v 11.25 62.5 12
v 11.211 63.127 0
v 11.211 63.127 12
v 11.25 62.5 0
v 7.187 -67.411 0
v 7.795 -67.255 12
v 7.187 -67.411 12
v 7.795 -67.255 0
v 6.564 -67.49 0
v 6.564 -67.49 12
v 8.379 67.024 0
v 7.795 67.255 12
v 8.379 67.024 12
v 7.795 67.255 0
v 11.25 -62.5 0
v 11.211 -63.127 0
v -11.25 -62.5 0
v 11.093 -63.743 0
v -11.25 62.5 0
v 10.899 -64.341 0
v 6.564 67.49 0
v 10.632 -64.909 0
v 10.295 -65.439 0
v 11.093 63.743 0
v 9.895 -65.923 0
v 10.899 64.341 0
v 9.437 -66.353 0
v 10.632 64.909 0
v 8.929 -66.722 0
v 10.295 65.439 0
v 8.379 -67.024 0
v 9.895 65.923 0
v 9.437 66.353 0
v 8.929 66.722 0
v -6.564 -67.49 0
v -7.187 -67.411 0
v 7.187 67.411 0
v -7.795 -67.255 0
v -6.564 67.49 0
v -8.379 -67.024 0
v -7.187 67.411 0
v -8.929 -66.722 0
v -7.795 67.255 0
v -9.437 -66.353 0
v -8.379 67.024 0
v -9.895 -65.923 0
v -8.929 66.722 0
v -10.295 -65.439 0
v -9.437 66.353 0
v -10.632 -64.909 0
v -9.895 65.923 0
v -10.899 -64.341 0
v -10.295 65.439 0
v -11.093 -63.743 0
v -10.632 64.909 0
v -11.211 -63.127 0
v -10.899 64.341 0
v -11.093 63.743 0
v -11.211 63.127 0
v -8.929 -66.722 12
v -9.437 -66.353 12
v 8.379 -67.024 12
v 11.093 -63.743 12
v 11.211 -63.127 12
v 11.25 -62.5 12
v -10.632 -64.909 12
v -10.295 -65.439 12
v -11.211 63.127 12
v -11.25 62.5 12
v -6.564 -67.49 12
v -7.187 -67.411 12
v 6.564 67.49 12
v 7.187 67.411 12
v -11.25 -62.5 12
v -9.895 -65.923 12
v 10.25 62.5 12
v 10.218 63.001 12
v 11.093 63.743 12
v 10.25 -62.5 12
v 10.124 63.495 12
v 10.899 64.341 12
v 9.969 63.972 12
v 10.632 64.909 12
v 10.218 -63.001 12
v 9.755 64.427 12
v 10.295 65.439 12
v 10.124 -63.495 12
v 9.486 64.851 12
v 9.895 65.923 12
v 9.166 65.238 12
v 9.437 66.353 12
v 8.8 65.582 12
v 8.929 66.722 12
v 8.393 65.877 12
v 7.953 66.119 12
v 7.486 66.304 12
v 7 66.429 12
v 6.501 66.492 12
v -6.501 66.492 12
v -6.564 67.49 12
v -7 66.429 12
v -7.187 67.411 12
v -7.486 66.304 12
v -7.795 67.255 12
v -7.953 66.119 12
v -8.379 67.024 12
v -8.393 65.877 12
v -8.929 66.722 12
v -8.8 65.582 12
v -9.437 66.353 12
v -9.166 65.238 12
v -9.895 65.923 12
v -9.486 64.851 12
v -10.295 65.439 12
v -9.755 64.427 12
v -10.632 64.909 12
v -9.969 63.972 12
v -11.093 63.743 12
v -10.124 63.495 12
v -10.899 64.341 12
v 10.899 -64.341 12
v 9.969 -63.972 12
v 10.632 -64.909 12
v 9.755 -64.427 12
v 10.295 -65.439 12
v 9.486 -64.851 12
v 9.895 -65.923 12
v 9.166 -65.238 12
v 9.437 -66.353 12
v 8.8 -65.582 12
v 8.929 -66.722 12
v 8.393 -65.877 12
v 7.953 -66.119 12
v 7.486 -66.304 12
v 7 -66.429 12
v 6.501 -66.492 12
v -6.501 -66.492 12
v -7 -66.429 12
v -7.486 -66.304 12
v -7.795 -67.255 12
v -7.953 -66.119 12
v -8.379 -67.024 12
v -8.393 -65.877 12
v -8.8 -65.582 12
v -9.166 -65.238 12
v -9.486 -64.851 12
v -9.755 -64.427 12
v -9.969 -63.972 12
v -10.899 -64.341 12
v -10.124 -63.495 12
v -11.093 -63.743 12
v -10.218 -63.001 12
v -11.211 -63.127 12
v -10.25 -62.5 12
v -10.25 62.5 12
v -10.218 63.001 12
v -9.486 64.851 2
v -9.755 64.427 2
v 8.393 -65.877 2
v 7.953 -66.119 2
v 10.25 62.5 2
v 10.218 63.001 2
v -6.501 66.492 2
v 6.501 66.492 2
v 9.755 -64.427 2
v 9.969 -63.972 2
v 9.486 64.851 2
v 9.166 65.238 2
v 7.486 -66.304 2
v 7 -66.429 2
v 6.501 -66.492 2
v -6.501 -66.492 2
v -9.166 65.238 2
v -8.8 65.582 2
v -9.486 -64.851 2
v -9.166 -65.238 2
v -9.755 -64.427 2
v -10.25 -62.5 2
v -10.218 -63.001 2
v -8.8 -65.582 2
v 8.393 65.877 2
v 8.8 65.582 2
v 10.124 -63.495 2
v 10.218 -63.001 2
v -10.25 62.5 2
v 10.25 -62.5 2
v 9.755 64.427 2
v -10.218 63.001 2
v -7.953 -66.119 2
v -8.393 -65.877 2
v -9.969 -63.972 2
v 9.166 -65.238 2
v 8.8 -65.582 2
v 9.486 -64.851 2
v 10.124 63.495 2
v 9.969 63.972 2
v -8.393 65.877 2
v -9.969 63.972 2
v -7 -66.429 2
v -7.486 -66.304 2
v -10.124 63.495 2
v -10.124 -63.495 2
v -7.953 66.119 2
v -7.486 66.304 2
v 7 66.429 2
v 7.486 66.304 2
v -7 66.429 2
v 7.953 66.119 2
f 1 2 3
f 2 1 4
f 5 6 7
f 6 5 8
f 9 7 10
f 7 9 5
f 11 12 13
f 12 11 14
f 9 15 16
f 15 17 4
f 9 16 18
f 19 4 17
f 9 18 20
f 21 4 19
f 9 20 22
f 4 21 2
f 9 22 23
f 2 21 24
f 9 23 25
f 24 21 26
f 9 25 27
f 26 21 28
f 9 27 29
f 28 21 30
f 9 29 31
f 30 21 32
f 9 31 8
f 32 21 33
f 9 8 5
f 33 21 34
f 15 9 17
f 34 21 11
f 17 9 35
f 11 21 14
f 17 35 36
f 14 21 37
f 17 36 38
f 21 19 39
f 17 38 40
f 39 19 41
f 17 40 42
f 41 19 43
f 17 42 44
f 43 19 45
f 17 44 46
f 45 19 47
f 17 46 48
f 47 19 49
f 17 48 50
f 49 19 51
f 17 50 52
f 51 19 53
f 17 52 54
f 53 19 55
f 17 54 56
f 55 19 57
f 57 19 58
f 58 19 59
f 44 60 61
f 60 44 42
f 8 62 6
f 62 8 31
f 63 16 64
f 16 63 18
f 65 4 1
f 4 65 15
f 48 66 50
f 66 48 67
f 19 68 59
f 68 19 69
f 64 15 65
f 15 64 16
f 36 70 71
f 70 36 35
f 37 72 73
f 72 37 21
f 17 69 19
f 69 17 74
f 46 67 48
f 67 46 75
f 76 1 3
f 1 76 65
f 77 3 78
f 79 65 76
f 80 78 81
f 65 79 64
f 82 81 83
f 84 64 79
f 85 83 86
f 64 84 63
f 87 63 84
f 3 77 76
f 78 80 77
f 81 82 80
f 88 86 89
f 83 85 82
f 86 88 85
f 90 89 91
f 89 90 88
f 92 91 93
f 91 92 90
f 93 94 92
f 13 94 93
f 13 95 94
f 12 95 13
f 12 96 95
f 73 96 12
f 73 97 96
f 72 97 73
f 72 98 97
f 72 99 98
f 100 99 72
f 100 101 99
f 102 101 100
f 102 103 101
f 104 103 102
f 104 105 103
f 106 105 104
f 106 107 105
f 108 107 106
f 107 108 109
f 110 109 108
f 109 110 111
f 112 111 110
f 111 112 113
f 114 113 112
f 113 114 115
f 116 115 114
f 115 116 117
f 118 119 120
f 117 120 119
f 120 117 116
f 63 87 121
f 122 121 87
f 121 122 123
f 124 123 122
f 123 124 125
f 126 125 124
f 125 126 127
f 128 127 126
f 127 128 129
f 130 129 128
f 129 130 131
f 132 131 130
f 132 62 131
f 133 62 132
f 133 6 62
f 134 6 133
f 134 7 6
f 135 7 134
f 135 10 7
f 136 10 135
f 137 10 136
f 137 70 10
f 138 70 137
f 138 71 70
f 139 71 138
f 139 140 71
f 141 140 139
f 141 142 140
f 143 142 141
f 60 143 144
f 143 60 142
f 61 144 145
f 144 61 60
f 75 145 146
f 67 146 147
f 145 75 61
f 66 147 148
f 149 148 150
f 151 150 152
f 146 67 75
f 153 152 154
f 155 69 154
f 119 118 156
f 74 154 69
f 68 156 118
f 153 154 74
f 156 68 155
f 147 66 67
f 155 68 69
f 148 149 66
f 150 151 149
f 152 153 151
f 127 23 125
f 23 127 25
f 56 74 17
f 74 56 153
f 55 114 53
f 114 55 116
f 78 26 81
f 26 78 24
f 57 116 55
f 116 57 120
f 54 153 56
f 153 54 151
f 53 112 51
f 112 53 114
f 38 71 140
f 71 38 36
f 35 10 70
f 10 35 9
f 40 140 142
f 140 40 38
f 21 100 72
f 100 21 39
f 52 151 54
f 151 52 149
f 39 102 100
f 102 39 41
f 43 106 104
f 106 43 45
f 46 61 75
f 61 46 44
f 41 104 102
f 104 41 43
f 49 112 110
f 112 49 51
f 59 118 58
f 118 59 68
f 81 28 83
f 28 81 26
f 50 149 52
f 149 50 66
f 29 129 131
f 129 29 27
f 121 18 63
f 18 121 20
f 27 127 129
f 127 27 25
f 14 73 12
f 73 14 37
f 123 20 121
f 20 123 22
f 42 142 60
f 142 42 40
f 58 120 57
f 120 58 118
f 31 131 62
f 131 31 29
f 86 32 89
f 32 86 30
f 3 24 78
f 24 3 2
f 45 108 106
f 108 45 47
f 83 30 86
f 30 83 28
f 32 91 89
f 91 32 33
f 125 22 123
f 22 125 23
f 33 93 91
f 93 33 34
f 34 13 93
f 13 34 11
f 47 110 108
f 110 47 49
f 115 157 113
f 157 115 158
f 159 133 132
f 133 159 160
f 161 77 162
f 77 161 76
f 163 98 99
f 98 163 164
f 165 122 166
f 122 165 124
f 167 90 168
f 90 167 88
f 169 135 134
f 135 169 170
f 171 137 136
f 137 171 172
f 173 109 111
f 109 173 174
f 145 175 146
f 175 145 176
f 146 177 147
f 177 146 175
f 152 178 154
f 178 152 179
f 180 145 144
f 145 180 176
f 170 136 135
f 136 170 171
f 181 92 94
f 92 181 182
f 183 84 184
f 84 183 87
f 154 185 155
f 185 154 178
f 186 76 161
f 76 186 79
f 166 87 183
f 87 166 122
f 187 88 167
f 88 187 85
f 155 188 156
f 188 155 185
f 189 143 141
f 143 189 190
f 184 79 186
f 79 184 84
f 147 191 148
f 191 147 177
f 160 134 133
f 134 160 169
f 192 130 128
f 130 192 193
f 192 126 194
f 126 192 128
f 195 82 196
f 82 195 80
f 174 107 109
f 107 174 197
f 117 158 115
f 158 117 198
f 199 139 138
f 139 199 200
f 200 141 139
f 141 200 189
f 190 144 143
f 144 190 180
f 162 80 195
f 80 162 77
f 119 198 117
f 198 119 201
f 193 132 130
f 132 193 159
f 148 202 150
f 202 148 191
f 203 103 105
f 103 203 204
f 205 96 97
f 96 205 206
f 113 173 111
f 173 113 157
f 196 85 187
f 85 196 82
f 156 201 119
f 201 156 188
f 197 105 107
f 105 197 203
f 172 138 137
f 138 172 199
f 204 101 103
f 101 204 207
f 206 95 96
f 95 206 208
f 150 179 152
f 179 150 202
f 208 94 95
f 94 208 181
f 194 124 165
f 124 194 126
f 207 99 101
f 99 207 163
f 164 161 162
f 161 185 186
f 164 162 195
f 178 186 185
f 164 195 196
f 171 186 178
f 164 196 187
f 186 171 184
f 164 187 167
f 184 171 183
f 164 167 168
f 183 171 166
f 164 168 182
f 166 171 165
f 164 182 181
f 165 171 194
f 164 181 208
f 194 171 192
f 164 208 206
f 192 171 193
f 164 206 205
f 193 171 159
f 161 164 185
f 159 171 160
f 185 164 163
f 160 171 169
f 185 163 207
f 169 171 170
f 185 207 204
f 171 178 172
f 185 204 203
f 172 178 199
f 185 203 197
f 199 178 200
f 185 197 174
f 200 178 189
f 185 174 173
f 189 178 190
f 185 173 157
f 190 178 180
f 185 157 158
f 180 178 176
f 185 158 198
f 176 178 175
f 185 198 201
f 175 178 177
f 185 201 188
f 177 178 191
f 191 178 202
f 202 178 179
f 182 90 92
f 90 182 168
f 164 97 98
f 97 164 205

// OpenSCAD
$fn = 50;


difference() {
	union() {
		hull() {
			translate(v = [-6.2500000000, 62.5000000000, 0]) {
				cylinder(h = 12, r = 5);
			}
			translate(v = [6.2500000000, 62.5000000000, 0]) {
				cylinder(h = 12, r = 5);
			}
			translate(v = [-6.2500000000, -62.5000000000, 0]) {
				cylinder(h = 12, r = 5);
			}
			translate(v = [6.2500000000, -62.5000000000, 0]) {
				cylinder(h = 12, r = 5);
			}
		}
	}
	union() {
		translate(v = [0, 0, 2]) {
			hull() {
				translate(v = [-6.2500000000, 62.5000000000, 0]) {
					cylinder(h = 10, r = 4);
				}
				translate(v = [6.2500000000, 62.5000000000, 0]) {
					cylinder(h = 10, r = 4);
				}
				translate(v = [-6.2500000000, -62.5000000000, 0]) {
					cylinder(h = 10, r = 4);
				}
				translate(v = [6.2500000000, -62.5000000000, 0]) {
					cylinder(h = 10, r = 4);
				}
			}
		}
	}
}
